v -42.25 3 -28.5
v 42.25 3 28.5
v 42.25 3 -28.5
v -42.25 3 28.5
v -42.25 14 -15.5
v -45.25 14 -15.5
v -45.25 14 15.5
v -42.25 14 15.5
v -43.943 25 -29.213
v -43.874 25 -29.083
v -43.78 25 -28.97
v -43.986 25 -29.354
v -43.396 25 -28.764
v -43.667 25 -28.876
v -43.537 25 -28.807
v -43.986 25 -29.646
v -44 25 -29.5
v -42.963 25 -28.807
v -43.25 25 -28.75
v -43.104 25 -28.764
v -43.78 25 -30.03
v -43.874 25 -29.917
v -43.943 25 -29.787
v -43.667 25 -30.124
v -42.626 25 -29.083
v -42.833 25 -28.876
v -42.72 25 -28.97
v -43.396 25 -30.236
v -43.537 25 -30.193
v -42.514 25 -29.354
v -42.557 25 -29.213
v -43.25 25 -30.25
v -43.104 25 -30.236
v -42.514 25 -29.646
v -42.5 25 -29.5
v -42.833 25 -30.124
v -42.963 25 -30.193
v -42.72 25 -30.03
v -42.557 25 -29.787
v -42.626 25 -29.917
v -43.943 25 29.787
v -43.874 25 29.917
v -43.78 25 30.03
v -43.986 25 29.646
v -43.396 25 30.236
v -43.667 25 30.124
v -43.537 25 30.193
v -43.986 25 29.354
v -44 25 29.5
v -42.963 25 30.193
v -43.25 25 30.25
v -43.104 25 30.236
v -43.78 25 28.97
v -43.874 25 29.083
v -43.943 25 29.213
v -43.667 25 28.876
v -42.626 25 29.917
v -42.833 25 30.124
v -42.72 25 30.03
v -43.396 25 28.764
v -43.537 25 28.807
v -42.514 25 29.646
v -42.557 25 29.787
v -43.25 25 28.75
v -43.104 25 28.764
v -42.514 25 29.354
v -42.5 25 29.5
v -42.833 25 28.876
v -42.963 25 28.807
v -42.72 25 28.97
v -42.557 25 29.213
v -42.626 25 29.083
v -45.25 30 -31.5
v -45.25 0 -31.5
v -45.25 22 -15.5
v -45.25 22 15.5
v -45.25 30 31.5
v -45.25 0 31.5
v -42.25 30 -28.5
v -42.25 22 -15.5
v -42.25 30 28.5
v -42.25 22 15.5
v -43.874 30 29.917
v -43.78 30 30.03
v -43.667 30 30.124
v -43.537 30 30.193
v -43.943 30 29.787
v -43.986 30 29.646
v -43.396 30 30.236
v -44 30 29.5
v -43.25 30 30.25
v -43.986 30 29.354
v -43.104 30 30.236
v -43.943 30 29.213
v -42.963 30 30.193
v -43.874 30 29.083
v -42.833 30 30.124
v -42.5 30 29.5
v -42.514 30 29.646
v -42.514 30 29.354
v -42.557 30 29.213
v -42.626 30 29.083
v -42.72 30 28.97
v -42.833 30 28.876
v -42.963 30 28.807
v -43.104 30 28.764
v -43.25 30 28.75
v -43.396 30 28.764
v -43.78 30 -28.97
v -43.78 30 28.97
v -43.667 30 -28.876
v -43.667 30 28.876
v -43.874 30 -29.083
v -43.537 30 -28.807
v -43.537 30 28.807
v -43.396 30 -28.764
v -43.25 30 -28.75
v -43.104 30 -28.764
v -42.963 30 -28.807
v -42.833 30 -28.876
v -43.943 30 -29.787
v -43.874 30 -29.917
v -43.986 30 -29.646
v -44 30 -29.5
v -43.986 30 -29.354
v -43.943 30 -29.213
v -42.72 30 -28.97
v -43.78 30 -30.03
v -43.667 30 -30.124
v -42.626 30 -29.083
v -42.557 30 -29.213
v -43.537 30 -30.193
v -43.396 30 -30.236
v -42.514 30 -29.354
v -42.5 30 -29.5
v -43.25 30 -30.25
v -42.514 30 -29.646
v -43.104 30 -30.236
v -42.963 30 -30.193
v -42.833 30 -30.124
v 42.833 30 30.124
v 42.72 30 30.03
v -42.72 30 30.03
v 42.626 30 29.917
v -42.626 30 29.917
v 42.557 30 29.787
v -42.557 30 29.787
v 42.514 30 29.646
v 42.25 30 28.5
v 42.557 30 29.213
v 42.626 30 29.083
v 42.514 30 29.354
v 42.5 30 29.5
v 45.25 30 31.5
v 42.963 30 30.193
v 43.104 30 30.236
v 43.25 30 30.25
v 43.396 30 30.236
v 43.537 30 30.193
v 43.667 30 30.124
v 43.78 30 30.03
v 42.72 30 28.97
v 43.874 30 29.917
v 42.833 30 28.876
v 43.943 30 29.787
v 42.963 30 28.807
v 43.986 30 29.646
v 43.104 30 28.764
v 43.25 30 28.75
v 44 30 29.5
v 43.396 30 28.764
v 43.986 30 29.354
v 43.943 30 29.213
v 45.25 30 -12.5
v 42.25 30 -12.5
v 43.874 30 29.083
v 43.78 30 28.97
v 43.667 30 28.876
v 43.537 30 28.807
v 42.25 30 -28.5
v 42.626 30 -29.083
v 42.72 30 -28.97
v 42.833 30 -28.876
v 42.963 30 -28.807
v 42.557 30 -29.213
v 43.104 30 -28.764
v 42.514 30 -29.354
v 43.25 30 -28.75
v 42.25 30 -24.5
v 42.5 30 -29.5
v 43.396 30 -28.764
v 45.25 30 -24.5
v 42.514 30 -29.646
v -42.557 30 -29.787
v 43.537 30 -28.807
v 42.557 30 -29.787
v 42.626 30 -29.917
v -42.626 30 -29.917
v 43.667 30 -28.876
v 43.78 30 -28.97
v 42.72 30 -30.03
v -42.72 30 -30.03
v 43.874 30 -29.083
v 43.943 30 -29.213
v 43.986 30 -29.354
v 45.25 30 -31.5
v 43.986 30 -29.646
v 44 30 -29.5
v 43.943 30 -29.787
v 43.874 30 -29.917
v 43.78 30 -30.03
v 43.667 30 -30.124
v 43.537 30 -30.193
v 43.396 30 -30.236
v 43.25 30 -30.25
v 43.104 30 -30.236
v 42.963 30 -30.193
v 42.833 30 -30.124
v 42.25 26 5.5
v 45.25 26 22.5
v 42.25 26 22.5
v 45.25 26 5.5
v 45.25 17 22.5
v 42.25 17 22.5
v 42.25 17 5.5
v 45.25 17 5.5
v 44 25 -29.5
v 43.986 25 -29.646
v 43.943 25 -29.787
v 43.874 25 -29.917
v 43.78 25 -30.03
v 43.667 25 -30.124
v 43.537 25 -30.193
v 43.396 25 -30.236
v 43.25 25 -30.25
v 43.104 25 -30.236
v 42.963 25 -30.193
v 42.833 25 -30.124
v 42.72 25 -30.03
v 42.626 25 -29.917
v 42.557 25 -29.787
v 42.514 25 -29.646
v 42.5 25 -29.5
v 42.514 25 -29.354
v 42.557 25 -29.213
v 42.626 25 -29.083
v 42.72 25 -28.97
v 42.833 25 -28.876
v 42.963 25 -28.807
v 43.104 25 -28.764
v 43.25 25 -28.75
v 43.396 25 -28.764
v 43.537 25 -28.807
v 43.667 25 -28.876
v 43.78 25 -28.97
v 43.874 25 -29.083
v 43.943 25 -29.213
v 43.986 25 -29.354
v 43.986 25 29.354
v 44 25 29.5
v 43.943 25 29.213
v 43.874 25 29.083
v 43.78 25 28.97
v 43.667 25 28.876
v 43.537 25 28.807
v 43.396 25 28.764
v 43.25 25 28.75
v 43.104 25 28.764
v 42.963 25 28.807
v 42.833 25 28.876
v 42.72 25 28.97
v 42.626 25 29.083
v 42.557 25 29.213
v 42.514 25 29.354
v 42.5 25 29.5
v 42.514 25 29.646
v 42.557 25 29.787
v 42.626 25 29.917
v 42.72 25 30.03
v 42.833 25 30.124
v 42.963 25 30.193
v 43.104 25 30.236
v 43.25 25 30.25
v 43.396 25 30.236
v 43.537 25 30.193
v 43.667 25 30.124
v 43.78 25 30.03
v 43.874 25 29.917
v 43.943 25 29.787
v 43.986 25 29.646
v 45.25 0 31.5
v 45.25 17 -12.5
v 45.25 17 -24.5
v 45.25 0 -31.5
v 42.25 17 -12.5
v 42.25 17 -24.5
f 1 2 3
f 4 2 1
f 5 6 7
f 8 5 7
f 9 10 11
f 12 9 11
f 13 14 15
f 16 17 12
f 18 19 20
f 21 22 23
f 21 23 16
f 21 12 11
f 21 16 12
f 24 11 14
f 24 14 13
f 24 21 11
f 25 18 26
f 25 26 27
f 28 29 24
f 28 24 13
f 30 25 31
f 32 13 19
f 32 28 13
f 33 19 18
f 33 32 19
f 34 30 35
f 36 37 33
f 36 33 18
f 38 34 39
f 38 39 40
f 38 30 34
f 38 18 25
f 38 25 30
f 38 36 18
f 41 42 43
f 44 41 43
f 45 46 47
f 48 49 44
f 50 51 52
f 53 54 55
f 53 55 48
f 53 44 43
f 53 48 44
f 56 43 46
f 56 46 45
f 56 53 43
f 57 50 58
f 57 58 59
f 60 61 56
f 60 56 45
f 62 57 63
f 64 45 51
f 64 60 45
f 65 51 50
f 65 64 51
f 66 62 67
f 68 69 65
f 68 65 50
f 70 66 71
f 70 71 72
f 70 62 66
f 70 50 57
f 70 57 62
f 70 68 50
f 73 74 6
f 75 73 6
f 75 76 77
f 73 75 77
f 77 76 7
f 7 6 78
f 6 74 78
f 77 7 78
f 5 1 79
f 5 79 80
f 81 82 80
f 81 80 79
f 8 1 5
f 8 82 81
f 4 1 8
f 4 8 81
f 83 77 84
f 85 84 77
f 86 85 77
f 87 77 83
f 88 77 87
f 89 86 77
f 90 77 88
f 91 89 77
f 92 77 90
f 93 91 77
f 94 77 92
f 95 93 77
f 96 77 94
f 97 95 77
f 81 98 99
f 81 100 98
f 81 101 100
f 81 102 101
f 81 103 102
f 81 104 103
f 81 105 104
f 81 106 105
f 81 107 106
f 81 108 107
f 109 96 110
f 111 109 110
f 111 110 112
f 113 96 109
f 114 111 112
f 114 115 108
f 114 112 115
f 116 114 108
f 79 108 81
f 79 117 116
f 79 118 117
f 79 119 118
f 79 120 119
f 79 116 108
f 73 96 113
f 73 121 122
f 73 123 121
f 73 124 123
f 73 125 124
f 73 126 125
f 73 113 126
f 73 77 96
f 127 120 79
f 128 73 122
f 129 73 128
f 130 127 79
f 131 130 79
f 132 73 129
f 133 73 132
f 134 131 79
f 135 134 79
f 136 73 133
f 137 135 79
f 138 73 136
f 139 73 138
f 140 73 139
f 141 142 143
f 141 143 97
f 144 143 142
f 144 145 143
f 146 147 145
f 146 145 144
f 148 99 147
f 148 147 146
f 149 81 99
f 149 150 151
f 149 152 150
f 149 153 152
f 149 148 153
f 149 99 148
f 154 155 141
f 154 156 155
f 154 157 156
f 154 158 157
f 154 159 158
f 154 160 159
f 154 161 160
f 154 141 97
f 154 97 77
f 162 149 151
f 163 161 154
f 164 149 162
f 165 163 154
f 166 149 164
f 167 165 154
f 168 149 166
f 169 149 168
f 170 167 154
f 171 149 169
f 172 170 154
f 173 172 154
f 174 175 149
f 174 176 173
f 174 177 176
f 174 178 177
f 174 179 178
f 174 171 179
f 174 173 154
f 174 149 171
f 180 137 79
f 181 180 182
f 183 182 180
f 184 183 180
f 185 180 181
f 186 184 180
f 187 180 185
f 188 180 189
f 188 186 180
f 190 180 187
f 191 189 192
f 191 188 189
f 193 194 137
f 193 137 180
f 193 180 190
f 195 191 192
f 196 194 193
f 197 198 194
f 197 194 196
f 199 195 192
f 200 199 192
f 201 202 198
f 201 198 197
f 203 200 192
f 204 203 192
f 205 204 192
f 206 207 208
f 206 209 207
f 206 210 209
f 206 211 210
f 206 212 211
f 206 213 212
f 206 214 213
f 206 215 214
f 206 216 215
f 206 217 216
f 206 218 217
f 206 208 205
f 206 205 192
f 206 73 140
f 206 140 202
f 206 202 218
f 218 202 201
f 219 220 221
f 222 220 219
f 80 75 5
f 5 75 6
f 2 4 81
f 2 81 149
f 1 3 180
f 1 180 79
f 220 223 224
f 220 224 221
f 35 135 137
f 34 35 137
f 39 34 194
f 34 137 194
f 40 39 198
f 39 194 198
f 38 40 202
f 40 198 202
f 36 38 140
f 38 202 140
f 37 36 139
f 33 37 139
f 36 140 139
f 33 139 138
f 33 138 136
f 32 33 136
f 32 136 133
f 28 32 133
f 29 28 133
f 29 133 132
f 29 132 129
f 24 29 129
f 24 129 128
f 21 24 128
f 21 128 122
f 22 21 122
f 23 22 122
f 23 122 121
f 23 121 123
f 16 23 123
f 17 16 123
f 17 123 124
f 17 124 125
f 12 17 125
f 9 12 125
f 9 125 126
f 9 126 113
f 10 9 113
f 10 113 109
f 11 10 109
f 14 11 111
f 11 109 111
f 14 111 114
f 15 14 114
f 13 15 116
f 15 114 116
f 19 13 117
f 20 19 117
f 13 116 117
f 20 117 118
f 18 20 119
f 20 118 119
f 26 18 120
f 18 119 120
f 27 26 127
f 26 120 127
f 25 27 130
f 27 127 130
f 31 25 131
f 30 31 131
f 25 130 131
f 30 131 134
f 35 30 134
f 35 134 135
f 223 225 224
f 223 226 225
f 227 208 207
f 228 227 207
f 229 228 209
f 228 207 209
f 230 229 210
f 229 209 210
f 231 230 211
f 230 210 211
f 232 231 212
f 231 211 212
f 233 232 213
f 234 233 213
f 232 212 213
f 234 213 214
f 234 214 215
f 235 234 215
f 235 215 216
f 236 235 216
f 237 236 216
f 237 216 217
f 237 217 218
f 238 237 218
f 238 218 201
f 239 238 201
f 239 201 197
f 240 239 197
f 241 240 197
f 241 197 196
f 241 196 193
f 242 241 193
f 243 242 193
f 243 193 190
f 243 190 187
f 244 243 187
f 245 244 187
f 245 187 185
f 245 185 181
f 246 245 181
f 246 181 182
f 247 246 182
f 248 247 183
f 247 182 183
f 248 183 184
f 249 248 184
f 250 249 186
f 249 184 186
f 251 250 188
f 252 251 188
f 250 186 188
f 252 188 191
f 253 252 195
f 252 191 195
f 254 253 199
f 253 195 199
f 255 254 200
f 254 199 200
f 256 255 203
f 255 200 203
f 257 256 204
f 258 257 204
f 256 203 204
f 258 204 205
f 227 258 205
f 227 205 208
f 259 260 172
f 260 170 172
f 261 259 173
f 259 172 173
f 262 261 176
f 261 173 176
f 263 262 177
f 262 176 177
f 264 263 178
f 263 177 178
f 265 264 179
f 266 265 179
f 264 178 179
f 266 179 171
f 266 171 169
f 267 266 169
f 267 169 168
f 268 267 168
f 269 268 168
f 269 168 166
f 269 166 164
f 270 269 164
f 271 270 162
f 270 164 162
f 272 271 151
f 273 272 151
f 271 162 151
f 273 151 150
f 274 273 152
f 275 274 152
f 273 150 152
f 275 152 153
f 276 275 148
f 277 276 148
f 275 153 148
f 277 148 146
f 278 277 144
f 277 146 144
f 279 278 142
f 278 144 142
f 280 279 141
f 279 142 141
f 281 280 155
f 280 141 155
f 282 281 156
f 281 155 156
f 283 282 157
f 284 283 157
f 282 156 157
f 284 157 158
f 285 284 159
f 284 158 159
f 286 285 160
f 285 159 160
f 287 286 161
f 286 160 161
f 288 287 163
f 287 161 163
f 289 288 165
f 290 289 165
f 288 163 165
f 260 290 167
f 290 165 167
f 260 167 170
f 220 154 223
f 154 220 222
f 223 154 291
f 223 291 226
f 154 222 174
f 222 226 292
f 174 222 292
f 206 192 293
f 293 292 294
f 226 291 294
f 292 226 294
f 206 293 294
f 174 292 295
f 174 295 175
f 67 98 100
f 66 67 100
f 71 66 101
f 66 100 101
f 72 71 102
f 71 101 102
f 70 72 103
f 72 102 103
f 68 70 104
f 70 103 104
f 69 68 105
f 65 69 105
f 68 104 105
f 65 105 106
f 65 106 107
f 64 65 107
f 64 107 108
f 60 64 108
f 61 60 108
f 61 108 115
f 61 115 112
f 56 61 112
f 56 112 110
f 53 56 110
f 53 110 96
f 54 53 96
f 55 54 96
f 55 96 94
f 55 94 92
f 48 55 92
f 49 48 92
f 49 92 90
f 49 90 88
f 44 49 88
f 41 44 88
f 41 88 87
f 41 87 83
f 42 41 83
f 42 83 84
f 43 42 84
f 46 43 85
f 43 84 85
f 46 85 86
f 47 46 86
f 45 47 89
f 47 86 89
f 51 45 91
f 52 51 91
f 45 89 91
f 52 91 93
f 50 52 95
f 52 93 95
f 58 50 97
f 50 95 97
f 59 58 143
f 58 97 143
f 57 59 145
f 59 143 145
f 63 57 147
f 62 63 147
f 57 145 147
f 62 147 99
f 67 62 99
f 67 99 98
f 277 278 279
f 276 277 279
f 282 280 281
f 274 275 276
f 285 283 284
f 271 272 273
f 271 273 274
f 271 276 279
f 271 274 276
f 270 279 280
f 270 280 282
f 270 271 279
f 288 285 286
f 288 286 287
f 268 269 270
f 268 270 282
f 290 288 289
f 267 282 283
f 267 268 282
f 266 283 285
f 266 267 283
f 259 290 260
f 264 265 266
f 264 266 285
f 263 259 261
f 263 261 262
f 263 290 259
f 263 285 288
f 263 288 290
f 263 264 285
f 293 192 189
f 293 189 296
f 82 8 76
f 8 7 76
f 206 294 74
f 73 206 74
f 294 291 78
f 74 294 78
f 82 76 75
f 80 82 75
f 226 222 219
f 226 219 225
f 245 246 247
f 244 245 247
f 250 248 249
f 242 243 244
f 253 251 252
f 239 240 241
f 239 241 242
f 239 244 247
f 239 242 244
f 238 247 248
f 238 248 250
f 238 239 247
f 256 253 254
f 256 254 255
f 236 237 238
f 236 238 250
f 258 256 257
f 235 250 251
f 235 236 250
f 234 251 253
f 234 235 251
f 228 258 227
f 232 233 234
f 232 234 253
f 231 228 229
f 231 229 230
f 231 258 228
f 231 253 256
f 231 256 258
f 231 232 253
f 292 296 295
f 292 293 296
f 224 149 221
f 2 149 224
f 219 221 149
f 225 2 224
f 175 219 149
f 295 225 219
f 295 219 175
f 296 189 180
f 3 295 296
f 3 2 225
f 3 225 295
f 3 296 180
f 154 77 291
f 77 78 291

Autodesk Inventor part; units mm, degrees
ref_plane "YZ Plane" through (0, 0, 0) normal (1, 0, 0) x (0, 1, 0)
ref_plane "XZ Plane" through (0, 0, 0) normal (0, 1, 0) x (-1, 0, 0)
ref_plane "XY Plane" through (0, 0, 0) normal (0, 0, 1) x (1, 0, 0)
sketch "Sketch1" plane through (0, 0, 0) normal (0, 1, 0) x (-1, 0, 0)
  line L0 (45.25, 31.5) -> (-45.25, 31.5)
  line L1 (-45.25, 31.5) -> (-45.25, -31.5)
  line L2 (-45.25, -31.5) -> (45.25, -31.5)
  line L3 (45.25, -31.5) -> (45.25, 31.5)
  line L4 (45.25, 31.5) -> (-45.25, -31.5) construction
  line L5 (-45.25, 31.5) -> (45.25, -31.5) construction
  point P0 (0, 0)
  dimension "d0" = 63
  dimension "d1" = 90.5
extrude "Extrusion1" add sketch "Sketch1" along normal blind 3
sketch "Sketch2" plane through (0, 3, 0) normal (0, 1, 0) x (1, 0, 0)
  line L0 (-42.25, -28.5) -> (42.25, -28.5)
  line L1 (42.25, -28.5) -> (42.25, 28.5)
  line L2 (42.25, 28.5) -> (-42.25, 28.5)
  line L3 (-42.25, 28.5) -> (-42.25, -28.5)
  line L4 (-42.25, -28.5) -> (42.25, 28.5) construction
  line L5 (42.25, -28.5) -> (-42.25, 28.5) construction
  line L6 (45.25, -31.5) -> (45.25, 31.5) projected
  line L7 (-45.25, -31.5) -> (45.25, -31.5)
  line L8 (45.25, -31.5) -> (45.25, 31.5)
  line L9 (45.25, 31.5) -> (-45.25, 31.5)
  line L10 (-45.25, 31.5) -> (-45.25, -31.5)
  line L11 (-45.25, -31.5) -> (45.25, 31.5) construction
  line L12 (45.25, -31.5) -> (-45.25, 31.5) construction
  point P0 (0, 0)
  point P1 (45.25, -31.5)
  dimension "d4" = 57
  dimension "d5" = 84.5
extrude "Extrusion2" add sketch "Sketch2" along normal blind 27
sketch "Sketch3" plane through (0, 30, 0) normal (0, 1, 0) x (1, 0, 0)
  circle A0 centre (-43.25, 29.5) radius 0.75
  line L0 (45.25, 31.5) -> (-45.25, 31.5) projected
  line L1 (-45.25, 31.5) -> (-45.25, -31.5) projected
  circle A1 centre (-43.25, -29.5) radius 0.75
  line L2 (-45.25, -31.5) -> (45.25, -31.5) projected
  circle A2 centre (43.25, -29.5) radius 0.75
  line L3 (45.25, -31.5) -> (45.25, 31.5) projected
  circle A3 centre (43.25, 29.5) radius 0.75
  point P0 (0, 0)
  dimension "d8" = 2
  dimension "d9" = 2
  dimension "d10" = 1.5
  dimension "d11" = 2
  dimension "d12" = 2
  dimension "d13" = 1.5
  dimension "d14" = 2
  dimension "d15" = 2
  dimension "d16" = 1.5
  dimension "d17" = 2
  dimension "d18" = 2
  dimension "d19" = 1.5
extrude "Extrusion3" cut sketch "Sketch3" against normal blind 5 contours A0 | A1 | A2 | A3
sketch "Sketch5" plane through (-45.25, 0, -31.5) normal (-1, 0, 0) x (0, 0, 1)
  line L0 (16, 14) -> (47, 14)
  line L1 (47, 14) -> (47, 22)
  line L2 (47, 22) -> (16, 22)
  line L3 (16, 22) -> (16, 14)
  line L4 (0, 0) -> (63, 0) projected
  line L5 (0, 0) -> (0, 30) projected
  point P0 (31.5, 0)
  dimension "d23" = 14
  dimension "d24" = 8
  dimension "d25" = 31
  dimension "d26" = 16
extrude "Extrusion4" cut sketch "Sketch5" against normal blind 3
sketch "Sketch6" plane through (45.25, 0, 31.5) normal (1, 0, 0) x (0, 0, -1)
  line L0 (44, 30) -> (56, 30)
  line L1 (56, 30) -> (56, 17)
  line L2 (56, 17) -> (44, 17)
  line L3 (44, 17) -> (44, 30)
  line L4 (0, 0) -> (63, 0) projected
  line L5 (63, 0) -> (63, 30) projected
  line L6 (9, 26) -> (26, 26)
  line L7 (26, 26) -> (26, 17)
  line L8 (26, 17) -> (9, 17)
  line L9 (9, 17) -> (9, 26)
  line L10 (0, 0) -> (0, 30) projected
  point P0 (31.5, 0)
  dimension "d30" = 17
  dimension "d31" = 13
  dimension "d32" = 12
  dimension "d33" = 7
  dimension "d34" = 9
  dimension "d35" = 17
  dimension "d36" = 17
  dimension "d37" = 9
extrude "Extrusion5" cut sketch "Sketch6" against normal blind 3
properties part number "remoteswitchbox"
